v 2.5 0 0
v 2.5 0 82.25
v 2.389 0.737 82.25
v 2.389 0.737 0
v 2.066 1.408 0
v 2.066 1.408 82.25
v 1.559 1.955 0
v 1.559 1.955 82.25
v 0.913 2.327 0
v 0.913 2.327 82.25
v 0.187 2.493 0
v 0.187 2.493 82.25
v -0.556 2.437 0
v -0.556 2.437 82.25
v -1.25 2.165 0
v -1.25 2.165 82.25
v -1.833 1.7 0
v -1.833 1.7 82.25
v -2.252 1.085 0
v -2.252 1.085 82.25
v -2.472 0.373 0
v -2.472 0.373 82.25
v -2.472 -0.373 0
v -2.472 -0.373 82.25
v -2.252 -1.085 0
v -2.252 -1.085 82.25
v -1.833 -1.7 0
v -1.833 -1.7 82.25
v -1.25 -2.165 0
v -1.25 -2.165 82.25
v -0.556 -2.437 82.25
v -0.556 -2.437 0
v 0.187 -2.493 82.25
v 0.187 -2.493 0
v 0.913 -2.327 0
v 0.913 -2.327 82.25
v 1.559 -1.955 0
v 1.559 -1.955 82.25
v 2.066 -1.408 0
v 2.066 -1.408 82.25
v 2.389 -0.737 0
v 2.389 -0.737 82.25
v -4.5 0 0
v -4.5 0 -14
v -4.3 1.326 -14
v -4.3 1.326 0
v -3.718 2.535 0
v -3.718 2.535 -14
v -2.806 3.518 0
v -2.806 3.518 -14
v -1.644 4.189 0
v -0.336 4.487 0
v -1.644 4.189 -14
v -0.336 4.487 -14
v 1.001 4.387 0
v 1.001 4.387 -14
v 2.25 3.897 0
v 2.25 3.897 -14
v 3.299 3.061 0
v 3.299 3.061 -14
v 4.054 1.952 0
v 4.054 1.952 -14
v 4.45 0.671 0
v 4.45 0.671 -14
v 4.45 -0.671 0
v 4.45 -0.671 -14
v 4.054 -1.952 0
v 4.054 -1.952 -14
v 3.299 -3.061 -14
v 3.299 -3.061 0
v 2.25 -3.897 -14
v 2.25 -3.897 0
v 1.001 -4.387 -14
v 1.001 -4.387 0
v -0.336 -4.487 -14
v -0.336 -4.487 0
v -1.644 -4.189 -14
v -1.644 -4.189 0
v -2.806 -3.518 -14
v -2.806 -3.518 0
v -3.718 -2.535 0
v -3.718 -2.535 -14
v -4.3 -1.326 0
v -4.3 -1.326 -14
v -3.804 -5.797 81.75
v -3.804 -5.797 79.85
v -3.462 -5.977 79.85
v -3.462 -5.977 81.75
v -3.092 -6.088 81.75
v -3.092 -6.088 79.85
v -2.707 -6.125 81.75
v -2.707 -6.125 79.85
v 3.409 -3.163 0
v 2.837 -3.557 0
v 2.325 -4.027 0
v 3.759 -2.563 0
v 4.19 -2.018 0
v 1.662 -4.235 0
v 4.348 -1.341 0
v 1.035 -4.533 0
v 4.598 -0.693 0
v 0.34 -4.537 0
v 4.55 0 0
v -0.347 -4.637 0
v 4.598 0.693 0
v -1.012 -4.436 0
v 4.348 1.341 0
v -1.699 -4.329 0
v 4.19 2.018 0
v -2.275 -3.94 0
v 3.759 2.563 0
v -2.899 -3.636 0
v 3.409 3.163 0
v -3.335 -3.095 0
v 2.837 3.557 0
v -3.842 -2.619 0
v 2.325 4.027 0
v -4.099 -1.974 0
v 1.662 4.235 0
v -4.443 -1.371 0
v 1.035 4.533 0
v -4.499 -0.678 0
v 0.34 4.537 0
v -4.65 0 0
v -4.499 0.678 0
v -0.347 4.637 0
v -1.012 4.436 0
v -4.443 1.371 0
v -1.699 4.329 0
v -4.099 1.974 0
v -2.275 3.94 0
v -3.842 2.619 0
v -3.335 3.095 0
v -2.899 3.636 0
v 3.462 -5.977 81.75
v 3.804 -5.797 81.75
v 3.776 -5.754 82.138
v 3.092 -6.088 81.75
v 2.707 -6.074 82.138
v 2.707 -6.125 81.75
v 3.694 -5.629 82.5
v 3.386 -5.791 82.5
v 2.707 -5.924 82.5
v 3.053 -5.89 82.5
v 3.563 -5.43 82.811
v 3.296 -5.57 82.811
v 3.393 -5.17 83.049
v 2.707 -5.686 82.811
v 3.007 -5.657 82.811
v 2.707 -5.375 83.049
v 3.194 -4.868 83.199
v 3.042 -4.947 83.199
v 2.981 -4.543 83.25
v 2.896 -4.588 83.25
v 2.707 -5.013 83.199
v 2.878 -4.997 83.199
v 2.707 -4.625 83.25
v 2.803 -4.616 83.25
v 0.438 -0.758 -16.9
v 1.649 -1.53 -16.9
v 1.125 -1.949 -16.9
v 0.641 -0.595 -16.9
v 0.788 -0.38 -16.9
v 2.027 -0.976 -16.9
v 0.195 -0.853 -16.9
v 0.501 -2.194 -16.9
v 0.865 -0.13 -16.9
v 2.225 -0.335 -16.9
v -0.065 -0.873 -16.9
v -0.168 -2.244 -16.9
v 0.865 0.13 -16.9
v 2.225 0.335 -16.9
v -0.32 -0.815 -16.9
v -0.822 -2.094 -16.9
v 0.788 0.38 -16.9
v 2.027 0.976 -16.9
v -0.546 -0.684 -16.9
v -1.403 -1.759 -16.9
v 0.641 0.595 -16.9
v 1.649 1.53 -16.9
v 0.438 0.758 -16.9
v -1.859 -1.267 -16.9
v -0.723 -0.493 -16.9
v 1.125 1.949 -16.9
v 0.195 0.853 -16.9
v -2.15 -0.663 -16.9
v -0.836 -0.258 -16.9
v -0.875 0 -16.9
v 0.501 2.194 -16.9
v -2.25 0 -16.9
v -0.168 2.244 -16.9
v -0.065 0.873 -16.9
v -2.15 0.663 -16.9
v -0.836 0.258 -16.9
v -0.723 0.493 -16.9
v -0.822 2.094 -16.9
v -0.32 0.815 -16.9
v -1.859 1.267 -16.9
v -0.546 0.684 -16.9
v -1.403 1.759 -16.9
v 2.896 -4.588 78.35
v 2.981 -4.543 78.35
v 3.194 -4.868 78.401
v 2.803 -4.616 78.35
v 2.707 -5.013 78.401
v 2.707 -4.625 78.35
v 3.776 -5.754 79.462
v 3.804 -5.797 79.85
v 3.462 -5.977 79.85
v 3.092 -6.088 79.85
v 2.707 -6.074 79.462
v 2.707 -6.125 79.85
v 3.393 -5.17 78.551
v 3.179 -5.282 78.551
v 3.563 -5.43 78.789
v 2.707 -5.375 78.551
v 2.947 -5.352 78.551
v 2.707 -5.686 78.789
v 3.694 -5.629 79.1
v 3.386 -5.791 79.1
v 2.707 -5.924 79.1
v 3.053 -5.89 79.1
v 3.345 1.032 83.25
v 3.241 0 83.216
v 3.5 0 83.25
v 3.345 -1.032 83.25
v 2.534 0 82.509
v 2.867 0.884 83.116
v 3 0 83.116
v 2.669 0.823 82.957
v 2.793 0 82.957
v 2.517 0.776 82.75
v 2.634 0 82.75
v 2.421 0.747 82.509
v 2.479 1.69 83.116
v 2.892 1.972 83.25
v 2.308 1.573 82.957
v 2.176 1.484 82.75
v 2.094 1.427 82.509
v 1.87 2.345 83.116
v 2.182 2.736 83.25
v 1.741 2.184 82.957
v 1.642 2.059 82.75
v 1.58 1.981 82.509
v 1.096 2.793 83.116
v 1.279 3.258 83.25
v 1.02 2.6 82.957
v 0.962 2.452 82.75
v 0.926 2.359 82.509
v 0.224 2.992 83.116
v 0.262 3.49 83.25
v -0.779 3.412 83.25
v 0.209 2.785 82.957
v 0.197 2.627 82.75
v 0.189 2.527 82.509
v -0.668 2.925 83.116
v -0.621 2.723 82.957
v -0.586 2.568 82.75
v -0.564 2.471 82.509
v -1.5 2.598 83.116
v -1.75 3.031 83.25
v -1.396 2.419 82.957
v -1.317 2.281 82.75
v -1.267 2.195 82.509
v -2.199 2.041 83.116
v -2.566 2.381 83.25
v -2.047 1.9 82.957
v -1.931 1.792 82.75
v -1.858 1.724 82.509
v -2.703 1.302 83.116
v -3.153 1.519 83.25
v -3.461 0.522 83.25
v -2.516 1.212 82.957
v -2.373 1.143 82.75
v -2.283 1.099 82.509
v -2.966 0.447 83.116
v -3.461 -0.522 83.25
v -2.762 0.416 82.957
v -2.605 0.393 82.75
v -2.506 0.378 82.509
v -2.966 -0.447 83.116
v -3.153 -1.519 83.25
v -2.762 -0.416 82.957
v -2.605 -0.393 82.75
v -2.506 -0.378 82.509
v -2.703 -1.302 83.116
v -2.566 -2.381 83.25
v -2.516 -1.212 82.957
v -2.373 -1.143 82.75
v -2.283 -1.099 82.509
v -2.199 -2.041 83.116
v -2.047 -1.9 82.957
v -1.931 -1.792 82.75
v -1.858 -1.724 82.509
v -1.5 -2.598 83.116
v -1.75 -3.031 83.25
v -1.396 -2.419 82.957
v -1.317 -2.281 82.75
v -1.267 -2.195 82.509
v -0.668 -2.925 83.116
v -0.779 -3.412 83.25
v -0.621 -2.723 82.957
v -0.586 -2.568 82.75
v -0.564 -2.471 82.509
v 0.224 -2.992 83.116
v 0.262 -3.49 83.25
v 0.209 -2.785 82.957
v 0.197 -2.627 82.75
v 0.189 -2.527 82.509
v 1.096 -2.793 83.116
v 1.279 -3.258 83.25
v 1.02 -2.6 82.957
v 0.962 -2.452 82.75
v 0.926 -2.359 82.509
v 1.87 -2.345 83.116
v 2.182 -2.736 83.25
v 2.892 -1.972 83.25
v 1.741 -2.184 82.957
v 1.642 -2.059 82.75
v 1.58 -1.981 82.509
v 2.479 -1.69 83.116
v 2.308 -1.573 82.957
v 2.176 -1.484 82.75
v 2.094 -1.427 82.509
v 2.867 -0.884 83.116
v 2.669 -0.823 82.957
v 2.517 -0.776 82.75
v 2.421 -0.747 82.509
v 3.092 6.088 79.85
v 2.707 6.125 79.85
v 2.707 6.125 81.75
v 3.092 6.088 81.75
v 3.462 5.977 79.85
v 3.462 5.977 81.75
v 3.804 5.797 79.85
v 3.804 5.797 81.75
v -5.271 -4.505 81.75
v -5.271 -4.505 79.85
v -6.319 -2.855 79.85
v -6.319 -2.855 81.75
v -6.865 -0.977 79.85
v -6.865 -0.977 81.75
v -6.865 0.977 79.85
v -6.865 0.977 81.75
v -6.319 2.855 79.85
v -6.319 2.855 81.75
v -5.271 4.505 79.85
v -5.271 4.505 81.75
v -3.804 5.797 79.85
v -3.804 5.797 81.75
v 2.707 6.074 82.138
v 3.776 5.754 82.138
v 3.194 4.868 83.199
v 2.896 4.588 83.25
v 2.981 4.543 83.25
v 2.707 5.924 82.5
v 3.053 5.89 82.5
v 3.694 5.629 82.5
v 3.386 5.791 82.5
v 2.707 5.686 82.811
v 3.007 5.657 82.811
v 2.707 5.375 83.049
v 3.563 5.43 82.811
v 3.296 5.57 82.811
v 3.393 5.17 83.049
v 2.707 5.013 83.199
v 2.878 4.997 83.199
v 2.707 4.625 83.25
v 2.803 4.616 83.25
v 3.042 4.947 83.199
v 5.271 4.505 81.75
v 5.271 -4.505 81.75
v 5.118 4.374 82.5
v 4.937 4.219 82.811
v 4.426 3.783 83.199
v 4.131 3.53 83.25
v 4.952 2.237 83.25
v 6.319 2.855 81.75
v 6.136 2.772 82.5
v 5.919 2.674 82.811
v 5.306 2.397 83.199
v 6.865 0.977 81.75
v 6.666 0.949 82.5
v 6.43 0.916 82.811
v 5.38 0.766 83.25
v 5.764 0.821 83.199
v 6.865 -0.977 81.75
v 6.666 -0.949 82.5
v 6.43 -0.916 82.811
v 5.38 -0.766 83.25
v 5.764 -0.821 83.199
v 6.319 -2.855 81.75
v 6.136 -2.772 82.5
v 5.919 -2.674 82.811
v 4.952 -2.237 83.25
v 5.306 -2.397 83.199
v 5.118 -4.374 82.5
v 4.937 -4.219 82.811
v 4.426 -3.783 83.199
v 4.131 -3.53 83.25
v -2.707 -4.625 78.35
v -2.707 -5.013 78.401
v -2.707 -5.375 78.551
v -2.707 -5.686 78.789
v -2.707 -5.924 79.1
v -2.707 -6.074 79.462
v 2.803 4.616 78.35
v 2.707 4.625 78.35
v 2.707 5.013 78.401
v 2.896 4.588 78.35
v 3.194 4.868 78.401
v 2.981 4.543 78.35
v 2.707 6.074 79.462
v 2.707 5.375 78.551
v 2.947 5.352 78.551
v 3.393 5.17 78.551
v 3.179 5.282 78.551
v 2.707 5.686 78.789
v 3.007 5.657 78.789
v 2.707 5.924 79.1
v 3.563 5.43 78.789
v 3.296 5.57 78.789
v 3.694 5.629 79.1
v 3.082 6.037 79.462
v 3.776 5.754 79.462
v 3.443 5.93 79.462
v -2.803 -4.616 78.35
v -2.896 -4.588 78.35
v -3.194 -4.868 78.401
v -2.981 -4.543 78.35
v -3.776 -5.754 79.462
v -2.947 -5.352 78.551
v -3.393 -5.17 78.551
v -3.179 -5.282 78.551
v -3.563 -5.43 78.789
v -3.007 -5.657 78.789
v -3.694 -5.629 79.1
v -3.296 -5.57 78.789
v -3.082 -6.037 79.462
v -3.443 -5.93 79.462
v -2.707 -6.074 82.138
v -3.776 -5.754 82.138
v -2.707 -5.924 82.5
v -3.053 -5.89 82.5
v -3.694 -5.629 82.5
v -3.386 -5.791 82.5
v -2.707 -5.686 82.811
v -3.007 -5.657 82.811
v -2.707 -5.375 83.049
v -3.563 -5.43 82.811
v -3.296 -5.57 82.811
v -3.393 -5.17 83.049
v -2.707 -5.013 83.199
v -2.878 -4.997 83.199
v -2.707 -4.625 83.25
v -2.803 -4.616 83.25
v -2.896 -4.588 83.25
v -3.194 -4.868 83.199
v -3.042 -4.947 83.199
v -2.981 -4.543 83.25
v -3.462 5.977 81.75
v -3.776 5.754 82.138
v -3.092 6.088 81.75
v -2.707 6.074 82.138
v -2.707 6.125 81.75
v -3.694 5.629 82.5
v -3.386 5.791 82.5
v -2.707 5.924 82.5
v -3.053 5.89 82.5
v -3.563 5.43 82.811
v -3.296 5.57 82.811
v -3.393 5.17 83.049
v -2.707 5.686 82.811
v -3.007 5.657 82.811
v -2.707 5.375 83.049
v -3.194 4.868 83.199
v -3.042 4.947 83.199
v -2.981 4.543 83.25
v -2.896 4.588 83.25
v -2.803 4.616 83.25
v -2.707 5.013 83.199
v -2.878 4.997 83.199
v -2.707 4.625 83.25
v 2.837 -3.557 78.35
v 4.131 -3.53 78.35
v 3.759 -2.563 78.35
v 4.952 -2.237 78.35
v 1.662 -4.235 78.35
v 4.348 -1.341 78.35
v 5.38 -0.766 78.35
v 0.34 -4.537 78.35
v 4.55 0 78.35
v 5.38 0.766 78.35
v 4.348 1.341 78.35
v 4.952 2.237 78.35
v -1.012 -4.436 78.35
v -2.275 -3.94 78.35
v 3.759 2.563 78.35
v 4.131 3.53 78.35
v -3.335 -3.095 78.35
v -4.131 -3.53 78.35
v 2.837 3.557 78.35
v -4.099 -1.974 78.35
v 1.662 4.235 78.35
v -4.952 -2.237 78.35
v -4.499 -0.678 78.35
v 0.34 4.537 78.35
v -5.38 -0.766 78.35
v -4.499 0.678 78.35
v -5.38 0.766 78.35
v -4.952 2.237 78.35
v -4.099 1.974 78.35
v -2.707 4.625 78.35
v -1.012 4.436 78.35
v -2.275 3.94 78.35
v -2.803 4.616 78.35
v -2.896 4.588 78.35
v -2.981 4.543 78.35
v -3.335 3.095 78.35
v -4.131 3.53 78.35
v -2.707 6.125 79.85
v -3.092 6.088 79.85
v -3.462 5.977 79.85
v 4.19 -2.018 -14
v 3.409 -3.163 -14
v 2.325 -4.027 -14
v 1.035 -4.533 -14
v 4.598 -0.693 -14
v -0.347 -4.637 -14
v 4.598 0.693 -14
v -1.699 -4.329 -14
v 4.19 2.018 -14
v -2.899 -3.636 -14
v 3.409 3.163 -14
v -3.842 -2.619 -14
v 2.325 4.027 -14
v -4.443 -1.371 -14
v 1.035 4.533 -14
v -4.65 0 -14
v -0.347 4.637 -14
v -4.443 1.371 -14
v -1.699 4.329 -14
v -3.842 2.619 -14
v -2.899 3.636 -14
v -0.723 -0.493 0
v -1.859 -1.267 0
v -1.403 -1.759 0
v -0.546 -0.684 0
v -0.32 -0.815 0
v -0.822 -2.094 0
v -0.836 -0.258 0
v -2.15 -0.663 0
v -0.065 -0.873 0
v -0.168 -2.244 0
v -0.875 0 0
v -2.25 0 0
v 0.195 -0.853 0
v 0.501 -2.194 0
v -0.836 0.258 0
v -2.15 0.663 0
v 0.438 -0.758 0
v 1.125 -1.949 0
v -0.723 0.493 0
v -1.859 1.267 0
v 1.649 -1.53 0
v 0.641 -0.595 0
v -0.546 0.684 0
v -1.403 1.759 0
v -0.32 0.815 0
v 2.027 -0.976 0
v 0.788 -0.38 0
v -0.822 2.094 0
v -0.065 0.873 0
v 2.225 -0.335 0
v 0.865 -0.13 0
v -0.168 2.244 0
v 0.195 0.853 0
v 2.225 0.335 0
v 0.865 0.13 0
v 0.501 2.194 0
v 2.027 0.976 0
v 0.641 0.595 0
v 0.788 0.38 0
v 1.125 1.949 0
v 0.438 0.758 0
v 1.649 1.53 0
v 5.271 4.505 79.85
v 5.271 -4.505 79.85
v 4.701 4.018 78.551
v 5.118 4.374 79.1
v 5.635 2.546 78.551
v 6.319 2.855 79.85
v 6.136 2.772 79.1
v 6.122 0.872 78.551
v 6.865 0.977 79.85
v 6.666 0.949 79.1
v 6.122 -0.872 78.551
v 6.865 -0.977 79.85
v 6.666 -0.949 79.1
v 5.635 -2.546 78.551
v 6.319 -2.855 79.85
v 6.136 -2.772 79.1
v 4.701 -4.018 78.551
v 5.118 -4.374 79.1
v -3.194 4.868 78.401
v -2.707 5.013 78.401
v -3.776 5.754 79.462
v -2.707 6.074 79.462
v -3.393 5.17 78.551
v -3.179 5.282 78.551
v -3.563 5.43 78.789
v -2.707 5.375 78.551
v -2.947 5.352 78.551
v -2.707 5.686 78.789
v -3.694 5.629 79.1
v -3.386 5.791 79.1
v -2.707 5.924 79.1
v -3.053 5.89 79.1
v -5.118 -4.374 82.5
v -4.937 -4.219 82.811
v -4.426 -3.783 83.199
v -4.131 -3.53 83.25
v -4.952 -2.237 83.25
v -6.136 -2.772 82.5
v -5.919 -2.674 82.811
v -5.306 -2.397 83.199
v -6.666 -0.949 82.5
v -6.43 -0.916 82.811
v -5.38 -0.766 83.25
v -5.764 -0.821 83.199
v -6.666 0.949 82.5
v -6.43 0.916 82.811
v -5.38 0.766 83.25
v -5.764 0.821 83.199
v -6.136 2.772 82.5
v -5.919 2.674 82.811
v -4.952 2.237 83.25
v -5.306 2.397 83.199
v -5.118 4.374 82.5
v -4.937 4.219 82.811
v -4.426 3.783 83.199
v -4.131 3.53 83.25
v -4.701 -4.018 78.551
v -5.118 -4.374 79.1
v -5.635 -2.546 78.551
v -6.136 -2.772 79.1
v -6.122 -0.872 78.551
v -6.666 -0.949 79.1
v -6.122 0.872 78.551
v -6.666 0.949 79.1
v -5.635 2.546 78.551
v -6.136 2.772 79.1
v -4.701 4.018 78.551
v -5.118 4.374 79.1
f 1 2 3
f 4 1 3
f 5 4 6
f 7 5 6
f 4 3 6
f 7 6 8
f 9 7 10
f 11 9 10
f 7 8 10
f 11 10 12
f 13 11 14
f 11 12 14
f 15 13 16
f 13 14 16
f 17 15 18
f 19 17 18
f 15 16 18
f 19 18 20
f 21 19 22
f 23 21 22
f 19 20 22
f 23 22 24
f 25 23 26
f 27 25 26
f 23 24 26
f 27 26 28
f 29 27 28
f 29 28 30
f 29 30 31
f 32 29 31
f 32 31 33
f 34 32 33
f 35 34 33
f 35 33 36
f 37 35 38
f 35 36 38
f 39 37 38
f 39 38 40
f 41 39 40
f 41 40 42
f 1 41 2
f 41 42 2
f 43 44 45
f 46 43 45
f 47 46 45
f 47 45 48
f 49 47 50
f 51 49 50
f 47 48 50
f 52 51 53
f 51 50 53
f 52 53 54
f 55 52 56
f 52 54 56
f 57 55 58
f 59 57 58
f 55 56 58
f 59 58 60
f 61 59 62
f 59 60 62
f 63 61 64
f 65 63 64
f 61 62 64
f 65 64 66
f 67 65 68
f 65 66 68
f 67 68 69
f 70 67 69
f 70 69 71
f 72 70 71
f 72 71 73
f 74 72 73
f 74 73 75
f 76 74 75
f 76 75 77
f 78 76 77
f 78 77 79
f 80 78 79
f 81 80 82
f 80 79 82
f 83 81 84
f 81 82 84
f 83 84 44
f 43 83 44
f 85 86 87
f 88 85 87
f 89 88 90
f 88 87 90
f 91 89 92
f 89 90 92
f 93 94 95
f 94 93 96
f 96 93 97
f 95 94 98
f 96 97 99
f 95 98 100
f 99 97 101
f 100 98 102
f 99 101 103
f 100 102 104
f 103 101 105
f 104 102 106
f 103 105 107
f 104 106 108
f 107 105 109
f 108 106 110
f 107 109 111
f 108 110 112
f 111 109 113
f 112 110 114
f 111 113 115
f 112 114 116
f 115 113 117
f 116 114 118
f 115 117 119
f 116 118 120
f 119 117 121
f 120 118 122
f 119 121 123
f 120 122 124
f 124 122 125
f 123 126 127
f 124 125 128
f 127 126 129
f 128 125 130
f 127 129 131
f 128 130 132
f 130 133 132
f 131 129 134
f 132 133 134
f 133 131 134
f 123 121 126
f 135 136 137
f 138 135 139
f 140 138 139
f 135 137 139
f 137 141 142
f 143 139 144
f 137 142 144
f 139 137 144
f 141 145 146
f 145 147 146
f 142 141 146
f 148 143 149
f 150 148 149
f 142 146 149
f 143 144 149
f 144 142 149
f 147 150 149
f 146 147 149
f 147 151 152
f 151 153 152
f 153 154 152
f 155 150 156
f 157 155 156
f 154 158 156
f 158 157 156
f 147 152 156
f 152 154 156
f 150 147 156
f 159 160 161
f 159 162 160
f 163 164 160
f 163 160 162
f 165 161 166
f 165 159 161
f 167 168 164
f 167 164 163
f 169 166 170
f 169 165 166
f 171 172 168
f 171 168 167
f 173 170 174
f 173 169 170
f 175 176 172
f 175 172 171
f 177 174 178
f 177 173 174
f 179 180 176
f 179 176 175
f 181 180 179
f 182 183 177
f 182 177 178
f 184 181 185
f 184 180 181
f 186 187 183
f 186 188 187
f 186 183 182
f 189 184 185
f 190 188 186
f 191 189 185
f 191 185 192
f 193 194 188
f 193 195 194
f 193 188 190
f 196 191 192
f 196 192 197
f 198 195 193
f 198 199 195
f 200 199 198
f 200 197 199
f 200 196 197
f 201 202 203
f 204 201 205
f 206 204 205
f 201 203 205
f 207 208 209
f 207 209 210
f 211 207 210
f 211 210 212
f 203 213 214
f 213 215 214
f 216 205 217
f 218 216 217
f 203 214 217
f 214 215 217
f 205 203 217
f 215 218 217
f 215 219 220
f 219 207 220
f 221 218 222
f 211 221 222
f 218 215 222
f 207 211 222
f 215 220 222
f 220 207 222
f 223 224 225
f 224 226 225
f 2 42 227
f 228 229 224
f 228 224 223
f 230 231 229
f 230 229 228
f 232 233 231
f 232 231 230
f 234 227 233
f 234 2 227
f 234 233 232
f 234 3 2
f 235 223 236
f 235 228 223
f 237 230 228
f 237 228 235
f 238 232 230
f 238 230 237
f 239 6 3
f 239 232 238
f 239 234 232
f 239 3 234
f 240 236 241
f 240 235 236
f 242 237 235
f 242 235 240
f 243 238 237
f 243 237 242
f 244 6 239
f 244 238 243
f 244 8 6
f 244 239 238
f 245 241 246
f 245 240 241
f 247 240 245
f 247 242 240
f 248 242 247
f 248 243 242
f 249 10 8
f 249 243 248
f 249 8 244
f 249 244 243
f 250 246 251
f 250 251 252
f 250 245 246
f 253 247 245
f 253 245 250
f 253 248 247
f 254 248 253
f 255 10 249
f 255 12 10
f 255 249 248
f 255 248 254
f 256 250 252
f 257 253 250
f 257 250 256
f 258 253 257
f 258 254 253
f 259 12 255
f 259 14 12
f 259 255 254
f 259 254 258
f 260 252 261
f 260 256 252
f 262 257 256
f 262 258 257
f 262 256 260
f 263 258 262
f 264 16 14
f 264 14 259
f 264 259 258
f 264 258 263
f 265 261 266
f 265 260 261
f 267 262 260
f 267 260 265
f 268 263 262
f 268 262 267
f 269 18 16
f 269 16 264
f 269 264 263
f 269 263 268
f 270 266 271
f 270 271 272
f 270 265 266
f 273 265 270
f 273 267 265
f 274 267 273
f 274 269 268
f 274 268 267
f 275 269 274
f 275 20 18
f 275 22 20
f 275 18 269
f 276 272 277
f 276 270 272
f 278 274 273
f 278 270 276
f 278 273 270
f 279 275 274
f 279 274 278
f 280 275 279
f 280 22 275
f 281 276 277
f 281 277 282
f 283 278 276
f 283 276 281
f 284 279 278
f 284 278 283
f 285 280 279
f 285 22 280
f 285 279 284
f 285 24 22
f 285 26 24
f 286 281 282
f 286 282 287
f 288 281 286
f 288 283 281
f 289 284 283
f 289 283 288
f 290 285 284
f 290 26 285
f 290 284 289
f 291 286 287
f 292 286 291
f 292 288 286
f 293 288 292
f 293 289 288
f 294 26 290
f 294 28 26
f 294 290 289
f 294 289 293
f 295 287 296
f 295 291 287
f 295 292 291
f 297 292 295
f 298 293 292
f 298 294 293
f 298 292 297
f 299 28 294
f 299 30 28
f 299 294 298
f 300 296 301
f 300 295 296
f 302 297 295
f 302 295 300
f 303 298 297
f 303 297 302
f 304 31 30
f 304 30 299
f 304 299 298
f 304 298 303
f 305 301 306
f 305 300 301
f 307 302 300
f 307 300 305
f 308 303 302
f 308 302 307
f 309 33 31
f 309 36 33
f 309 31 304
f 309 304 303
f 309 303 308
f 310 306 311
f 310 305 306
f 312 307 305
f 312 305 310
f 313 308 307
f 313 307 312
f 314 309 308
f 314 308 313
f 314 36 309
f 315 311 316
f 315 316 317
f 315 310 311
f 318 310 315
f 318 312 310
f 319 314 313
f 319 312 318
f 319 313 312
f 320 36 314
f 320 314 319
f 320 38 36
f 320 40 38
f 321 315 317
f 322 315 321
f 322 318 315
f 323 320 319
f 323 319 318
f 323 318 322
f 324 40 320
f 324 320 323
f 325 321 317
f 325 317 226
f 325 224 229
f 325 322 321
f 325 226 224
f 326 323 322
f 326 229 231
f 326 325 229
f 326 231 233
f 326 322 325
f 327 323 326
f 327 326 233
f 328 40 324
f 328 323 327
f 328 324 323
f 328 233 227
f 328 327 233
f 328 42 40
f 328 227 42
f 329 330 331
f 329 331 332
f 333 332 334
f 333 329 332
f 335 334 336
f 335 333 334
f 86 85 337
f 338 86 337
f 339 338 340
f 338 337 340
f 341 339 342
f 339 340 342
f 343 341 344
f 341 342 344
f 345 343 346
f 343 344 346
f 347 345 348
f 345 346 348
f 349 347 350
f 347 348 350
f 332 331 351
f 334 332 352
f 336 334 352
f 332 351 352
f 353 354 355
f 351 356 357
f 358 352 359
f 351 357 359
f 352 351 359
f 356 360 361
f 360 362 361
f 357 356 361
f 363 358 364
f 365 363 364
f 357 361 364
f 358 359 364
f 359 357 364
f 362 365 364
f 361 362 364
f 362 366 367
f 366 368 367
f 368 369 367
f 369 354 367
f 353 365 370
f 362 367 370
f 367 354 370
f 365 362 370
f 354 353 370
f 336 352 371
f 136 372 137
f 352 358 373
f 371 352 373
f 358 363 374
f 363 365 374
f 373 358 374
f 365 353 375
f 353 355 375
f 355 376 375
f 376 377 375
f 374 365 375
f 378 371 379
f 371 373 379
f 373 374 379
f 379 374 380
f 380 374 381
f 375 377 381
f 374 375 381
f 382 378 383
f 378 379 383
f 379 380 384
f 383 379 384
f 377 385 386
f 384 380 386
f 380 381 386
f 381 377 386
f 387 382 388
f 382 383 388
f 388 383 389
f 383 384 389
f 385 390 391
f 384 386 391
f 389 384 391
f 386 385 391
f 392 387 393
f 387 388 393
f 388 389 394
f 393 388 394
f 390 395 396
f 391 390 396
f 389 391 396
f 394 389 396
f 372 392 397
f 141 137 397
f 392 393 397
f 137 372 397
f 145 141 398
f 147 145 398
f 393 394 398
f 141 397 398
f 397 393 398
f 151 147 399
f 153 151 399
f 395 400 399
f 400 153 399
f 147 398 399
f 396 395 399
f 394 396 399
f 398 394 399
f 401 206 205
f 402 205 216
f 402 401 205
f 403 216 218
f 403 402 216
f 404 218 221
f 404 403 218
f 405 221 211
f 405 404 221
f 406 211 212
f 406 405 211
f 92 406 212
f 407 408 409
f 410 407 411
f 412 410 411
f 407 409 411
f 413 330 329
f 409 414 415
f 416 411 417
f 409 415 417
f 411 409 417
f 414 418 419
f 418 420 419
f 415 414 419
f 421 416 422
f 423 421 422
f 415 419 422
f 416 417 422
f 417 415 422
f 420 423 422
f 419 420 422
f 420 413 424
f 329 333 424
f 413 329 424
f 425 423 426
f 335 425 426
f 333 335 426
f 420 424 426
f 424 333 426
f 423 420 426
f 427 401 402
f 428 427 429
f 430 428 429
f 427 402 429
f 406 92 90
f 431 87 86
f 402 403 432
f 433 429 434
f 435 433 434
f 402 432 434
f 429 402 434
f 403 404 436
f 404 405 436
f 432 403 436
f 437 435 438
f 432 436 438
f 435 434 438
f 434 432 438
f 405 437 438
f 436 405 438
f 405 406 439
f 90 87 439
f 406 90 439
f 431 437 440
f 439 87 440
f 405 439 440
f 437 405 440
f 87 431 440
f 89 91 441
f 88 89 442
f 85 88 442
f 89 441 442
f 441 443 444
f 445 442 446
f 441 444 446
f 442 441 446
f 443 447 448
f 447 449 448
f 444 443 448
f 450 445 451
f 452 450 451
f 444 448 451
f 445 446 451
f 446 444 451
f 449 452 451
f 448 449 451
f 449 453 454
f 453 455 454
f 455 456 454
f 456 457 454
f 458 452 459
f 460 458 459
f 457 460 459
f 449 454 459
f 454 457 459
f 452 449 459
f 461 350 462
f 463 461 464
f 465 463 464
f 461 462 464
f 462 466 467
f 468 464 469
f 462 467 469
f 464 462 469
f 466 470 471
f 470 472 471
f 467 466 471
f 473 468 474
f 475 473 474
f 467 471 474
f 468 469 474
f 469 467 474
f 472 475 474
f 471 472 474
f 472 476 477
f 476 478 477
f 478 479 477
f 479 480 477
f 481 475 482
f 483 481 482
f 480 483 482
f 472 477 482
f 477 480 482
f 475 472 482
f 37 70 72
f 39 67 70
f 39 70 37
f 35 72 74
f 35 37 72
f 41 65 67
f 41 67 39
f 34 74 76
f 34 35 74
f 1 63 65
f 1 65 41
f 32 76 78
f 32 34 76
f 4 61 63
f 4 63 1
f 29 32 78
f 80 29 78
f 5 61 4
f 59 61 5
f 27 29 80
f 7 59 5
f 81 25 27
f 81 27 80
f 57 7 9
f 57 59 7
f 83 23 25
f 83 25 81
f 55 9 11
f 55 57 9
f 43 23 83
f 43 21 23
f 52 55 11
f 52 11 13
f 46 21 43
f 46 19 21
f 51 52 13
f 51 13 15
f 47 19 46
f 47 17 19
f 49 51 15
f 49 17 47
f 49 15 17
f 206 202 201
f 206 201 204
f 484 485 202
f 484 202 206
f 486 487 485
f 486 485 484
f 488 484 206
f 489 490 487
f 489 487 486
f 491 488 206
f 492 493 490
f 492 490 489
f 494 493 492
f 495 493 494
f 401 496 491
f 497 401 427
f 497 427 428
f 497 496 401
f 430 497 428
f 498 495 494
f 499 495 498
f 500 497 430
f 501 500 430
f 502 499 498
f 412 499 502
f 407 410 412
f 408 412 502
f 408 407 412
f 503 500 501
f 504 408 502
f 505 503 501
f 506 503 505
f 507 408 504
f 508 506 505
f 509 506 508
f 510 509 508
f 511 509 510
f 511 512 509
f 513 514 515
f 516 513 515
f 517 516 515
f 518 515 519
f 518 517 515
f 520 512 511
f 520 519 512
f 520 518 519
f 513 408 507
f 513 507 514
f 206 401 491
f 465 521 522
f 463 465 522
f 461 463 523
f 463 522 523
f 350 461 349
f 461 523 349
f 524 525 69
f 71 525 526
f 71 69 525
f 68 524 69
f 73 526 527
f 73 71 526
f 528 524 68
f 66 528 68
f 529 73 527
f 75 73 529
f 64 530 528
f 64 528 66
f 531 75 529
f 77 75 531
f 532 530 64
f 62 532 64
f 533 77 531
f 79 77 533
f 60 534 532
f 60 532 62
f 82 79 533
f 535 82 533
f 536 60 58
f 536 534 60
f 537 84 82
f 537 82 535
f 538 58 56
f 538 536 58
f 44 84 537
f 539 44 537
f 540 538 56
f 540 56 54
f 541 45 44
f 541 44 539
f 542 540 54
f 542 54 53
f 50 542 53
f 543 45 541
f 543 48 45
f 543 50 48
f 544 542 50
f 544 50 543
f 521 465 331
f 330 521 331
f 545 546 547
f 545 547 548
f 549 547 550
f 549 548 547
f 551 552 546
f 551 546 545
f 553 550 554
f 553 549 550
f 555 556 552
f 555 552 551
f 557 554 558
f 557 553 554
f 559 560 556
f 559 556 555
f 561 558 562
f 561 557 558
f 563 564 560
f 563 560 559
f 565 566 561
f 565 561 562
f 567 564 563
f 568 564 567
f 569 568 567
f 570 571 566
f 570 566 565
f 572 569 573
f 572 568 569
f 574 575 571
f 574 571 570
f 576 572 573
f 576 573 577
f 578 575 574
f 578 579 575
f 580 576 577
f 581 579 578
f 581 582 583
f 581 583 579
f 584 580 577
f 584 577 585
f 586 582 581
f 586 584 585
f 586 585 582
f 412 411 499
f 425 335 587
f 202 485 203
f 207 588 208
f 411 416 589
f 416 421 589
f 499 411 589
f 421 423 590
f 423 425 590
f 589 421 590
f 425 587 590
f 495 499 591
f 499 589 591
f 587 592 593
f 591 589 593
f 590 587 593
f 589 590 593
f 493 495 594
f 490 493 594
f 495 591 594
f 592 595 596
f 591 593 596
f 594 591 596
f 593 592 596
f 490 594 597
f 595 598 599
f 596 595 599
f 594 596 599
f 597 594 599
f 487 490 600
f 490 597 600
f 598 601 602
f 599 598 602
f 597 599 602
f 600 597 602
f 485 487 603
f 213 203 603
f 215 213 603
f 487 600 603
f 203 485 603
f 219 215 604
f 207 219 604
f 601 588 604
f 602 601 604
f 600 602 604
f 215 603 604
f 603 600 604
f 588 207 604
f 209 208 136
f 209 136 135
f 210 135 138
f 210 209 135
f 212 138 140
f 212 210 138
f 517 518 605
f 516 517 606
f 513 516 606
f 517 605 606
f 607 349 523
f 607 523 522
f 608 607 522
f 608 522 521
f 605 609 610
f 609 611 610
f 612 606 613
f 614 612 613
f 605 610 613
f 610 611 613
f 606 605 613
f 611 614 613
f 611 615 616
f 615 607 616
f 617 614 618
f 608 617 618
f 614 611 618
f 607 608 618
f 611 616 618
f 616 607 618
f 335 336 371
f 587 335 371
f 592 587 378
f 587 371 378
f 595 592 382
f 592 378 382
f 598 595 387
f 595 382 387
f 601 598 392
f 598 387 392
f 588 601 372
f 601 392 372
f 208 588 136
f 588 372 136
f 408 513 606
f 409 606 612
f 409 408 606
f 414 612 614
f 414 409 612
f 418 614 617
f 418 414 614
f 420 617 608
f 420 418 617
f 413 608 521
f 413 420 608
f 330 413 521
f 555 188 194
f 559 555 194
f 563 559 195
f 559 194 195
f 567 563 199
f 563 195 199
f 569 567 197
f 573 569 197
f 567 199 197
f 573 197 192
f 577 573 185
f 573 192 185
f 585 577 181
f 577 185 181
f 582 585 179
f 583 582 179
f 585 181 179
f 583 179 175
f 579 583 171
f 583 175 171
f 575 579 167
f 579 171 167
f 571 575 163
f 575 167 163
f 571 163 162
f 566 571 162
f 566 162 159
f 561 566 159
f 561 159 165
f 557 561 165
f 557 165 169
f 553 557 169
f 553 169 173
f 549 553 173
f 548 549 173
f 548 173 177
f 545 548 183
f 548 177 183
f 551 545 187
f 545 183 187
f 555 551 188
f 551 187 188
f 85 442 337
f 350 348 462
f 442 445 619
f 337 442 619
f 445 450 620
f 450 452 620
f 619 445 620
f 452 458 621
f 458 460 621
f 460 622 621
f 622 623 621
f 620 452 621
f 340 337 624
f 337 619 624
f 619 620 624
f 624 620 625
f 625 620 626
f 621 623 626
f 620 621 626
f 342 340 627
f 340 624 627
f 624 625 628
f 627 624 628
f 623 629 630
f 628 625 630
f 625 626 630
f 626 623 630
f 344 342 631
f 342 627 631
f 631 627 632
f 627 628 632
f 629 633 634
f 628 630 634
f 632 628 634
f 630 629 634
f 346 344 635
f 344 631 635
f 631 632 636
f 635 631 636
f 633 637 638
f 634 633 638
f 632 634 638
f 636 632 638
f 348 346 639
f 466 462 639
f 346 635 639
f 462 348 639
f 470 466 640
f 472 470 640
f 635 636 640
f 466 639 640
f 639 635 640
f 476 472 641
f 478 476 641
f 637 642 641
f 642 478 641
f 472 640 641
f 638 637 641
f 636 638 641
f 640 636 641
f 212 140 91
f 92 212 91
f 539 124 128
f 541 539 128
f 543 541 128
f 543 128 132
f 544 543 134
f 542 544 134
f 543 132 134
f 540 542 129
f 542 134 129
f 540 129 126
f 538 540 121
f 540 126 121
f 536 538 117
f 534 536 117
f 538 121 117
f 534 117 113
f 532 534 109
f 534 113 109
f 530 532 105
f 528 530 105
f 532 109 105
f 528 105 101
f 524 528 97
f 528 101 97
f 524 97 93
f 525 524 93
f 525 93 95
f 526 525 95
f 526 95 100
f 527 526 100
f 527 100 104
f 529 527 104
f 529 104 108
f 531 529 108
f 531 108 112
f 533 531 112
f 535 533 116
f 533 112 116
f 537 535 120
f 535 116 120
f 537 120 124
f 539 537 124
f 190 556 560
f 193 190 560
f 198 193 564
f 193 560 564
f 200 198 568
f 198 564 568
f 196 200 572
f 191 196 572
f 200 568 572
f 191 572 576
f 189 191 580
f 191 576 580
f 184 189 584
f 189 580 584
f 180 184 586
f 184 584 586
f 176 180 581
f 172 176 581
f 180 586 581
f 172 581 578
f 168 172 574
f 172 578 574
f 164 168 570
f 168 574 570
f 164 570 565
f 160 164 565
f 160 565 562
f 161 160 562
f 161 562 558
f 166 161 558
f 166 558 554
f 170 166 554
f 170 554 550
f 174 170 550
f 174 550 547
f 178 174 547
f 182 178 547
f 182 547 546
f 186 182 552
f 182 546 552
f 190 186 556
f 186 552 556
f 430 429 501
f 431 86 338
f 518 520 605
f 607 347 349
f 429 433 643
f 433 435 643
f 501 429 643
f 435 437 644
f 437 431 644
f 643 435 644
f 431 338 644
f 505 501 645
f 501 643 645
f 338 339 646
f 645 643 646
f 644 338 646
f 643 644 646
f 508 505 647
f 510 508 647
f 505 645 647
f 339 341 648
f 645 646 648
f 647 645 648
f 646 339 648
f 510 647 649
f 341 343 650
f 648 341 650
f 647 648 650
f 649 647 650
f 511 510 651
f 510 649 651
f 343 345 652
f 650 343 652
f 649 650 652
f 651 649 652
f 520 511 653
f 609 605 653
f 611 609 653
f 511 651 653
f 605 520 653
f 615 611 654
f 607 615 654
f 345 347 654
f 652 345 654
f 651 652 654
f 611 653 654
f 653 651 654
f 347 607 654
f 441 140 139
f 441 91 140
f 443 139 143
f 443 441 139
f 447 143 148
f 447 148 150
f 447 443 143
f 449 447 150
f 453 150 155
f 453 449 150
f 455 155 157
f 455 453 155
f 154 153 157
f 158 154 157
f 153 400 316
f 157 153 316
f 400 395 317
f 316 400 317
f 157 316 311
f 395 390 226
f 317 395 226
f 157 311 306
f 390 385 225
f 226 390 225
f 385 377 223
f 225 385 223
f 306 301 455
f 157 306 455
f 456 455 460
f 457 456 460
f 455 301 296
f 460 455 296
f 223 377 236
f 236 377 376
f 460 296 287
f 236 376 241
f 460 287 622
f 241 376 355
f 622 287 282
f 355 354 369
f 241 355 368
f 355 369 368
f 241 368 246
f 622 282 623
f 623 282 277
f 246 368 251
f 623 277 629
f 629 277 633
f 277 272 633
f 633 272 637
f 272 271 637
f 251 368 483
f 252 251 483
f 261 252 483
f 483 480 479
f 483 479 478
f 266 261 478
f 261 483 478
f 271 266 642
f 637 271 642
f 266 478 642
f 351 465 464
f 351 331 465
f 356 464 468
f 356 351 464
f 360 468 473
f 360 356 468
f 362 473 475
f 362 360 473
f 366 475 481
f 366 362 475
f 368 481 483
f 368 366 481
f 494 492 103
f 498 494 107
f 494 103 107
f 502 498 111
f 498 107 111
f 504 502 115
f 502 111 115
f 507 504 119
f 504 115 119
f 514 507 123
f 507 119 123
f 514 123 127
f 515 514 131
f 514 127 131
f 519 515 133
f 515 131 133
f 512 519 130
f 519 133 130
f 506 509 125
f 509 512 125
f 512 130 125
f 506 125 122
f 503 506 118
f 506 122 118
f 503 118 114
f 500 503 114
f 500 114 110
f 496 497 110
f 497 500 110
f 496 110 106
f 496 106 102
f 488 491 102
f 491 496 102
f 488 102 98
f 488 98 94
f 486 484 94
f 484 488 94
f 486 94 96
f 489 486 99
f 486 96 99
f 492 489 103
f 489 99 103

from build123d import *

# Parameters (mm, degrees)
SKETCH1_R           = 4.55
BOSS_EXTRUDE1_DEPTH = 83.25
BOSS_EXTRUDE2_DEPTH = 4.9
SKETCH3_R           = 4.65
BOSS_EXTRUDE3_DEPTH = 14
SKETCH4_R           = 4.5
CUT_EXTRUDE1_DEPTH  = 14
SKETCH5_R           = 2.25
BOSS_EXTRUDE4_DEPTH = 16.9
SKETCH6_R           = 0.875
CUT_EXTRUDE2_DEPTH  = 16.9
SKETCH7_R           = 2.5
CUT_EXTRUDE3_DEPTH  = 83.25
FILLET4_R           = 2
FILLET5_R           = 1.5
FILLET6_R           = 1.5
FILLET7_R           = 1


with BuildPart() as part:
    # Sketch1 → Boss-Extrude1 (new body)
    with BuildSketch(Plane.XY):
        Circle(SKETCH1_R)
    extrude(amount=BOSS_EXTRUDE1_DEPTH)

    # Sketch2 → Boss-Extrude2 (add)
    with BuildSketch(Plane.XY.offset(83.25)):
        with BuildLine():
            Line((-3.25, 6.125), (3.25, 6.125))
            ThreePointArc((3.25, 6.125), (6.933839124, 0), (3.25, -6.125))
            Line((3.25, -6.125), (-3.25, -6.125))
            ThreePointArc((-3.25, -6.125), (-6.933839124, 0), (-3.25, 6.125))
        make_face()
    extrude(amount=-BOSS_EXTRUDE2_DEPTH)

    # Sketch3 → Boss-Extrude3 (add)
    with BuildSketch(Plane(origin=(0, 0, 0), x_dir=(-1, 0, 0), z_dir=(0, 0, -1))):
        Circle(SKETCH3_R)
    extrude(amount=BOSS_EXTRUDE3_DEPTH)

    # Sketch4 → Cut-Extrude1 (cut)
    with BuildSketch(Plane(origin=(0, 0, -14), x_dir=(-1, 0, 0), z_dir=(0, 0, -1))):
        Circle(SKETCH4_R)
    extrude(amount=-CUT_EXTRUDE1_DEPTH, mode=Mode.SUBTRACT)

    # Sketch5 → Boss-Extrude4 (add)
    with BuildSketch(Plane(origin=(0, 0, 0), x_dir=(-1, 0, 0), z_dir=(0, 0, -1))):
        Circle(SKETCH5_R)
    extrude(amount=BOSS_EXTRUDE4_DEPTH)

    # Sketch6 → Cut-Extrude2 (cut)
    with BuildSketch(Plane(origin=(0, 0, -16.9), x_dir=(-1, 0, 0), z_dir=(0, 0, -1))):
        Circle(SKETCH6_R)
    extrude(amount=-CUT_EXTRUDE2_DEPTH, mode=Mode.SUBTRACT)

    # Sketch7 → Cut-Extrude3 (cut)
    with BuildSketch(Plane.XY.offset(83.25)):
        Circle(SKETCH7_R)
    extrude(amount=-CUT_EXTRUDE3_DEPTH, mode=Mode.SUBTRACT)


with BuildPart() as cut_extrude3_piece_1:
    # of the separate pieces the step leaves, piece 1, a body of its own (cut_extrude3_pieces)
    add(part.part.solids().sort_by_distance((-4.65, 0, 0))[0])

    # Fillet4
    fillet4_edges = [cut_extrude3_piece_1.edges().sort_by_distance(p)[0] for p in [
        (-3.25, -6.125, 80.8),
        (-3.25, 6.125, 80.8),
        (3.25, 6.125, 80.8),
        (3.25, -6.125, 80.8),
    ]]
    fillet(fillet4_edges, radius=FILLET4_R)

    # Fillet5
    fillet5_edges = [cut_extrude3_piece_1.edges().sort_by_distance(p)[0] for p in [
        (-6.933839124, 0, 83.25),
        (0, -6.125, 83.25),
        (6.933839124, 0, 83.25),
        (0, 6.125, 83.25),
        (-3.279472637, 6.041279171, 83.25),
        (3.279472637, 6.041279171, 83.25),
        (3.279472637, -6.041279171, 83.25),
        (-3.279472637, -6.041279171, 83.25),
    ]]
    fillet(fillet5_edges, radius=FILLET5_R)

    # Fillet6
    fillet6_edges = [cut_extrude3_piece_1.edges().sort_by_distance(p)[0] for p in [
        (-6.933839124, 0, 78.35),
        (0, -6.125, 78.35),
        (0, 6.125, 78.35),
        (6.933839124, 0, 78.35),
        (-3.279472637, 6.041279171, 78.35),
        (3.279472637, 6.041279171, 78.35),
        (3.279472637, -6.041279171, 78.35),
        (-3.279472637, -6.041279171, 78.35),
    ]]
    fillet(fillet6_edges, radius=FILLET6_R)

    # Fillet7
    fillet7_edges = [cut_extrude3_piece_1.edges().sort_by_distance(p)[0] for p in [
        (-2.5, 0, 83.25),
    ]]
    fillet(fillet7_edges, radius=FILLET7_R)


with BuildPart() as cut_extrude3_piece_2:
    # of the separate pieces the step leaves, piece 2, a body of its own (cut_extrude3_pieces)
    add(part.part.solids().sort_by_distance((-2.25, 0, 0))[0])


solid = Compound([cut_extrude3_piece_1.part, cut_extrude3_piece_2.part])
